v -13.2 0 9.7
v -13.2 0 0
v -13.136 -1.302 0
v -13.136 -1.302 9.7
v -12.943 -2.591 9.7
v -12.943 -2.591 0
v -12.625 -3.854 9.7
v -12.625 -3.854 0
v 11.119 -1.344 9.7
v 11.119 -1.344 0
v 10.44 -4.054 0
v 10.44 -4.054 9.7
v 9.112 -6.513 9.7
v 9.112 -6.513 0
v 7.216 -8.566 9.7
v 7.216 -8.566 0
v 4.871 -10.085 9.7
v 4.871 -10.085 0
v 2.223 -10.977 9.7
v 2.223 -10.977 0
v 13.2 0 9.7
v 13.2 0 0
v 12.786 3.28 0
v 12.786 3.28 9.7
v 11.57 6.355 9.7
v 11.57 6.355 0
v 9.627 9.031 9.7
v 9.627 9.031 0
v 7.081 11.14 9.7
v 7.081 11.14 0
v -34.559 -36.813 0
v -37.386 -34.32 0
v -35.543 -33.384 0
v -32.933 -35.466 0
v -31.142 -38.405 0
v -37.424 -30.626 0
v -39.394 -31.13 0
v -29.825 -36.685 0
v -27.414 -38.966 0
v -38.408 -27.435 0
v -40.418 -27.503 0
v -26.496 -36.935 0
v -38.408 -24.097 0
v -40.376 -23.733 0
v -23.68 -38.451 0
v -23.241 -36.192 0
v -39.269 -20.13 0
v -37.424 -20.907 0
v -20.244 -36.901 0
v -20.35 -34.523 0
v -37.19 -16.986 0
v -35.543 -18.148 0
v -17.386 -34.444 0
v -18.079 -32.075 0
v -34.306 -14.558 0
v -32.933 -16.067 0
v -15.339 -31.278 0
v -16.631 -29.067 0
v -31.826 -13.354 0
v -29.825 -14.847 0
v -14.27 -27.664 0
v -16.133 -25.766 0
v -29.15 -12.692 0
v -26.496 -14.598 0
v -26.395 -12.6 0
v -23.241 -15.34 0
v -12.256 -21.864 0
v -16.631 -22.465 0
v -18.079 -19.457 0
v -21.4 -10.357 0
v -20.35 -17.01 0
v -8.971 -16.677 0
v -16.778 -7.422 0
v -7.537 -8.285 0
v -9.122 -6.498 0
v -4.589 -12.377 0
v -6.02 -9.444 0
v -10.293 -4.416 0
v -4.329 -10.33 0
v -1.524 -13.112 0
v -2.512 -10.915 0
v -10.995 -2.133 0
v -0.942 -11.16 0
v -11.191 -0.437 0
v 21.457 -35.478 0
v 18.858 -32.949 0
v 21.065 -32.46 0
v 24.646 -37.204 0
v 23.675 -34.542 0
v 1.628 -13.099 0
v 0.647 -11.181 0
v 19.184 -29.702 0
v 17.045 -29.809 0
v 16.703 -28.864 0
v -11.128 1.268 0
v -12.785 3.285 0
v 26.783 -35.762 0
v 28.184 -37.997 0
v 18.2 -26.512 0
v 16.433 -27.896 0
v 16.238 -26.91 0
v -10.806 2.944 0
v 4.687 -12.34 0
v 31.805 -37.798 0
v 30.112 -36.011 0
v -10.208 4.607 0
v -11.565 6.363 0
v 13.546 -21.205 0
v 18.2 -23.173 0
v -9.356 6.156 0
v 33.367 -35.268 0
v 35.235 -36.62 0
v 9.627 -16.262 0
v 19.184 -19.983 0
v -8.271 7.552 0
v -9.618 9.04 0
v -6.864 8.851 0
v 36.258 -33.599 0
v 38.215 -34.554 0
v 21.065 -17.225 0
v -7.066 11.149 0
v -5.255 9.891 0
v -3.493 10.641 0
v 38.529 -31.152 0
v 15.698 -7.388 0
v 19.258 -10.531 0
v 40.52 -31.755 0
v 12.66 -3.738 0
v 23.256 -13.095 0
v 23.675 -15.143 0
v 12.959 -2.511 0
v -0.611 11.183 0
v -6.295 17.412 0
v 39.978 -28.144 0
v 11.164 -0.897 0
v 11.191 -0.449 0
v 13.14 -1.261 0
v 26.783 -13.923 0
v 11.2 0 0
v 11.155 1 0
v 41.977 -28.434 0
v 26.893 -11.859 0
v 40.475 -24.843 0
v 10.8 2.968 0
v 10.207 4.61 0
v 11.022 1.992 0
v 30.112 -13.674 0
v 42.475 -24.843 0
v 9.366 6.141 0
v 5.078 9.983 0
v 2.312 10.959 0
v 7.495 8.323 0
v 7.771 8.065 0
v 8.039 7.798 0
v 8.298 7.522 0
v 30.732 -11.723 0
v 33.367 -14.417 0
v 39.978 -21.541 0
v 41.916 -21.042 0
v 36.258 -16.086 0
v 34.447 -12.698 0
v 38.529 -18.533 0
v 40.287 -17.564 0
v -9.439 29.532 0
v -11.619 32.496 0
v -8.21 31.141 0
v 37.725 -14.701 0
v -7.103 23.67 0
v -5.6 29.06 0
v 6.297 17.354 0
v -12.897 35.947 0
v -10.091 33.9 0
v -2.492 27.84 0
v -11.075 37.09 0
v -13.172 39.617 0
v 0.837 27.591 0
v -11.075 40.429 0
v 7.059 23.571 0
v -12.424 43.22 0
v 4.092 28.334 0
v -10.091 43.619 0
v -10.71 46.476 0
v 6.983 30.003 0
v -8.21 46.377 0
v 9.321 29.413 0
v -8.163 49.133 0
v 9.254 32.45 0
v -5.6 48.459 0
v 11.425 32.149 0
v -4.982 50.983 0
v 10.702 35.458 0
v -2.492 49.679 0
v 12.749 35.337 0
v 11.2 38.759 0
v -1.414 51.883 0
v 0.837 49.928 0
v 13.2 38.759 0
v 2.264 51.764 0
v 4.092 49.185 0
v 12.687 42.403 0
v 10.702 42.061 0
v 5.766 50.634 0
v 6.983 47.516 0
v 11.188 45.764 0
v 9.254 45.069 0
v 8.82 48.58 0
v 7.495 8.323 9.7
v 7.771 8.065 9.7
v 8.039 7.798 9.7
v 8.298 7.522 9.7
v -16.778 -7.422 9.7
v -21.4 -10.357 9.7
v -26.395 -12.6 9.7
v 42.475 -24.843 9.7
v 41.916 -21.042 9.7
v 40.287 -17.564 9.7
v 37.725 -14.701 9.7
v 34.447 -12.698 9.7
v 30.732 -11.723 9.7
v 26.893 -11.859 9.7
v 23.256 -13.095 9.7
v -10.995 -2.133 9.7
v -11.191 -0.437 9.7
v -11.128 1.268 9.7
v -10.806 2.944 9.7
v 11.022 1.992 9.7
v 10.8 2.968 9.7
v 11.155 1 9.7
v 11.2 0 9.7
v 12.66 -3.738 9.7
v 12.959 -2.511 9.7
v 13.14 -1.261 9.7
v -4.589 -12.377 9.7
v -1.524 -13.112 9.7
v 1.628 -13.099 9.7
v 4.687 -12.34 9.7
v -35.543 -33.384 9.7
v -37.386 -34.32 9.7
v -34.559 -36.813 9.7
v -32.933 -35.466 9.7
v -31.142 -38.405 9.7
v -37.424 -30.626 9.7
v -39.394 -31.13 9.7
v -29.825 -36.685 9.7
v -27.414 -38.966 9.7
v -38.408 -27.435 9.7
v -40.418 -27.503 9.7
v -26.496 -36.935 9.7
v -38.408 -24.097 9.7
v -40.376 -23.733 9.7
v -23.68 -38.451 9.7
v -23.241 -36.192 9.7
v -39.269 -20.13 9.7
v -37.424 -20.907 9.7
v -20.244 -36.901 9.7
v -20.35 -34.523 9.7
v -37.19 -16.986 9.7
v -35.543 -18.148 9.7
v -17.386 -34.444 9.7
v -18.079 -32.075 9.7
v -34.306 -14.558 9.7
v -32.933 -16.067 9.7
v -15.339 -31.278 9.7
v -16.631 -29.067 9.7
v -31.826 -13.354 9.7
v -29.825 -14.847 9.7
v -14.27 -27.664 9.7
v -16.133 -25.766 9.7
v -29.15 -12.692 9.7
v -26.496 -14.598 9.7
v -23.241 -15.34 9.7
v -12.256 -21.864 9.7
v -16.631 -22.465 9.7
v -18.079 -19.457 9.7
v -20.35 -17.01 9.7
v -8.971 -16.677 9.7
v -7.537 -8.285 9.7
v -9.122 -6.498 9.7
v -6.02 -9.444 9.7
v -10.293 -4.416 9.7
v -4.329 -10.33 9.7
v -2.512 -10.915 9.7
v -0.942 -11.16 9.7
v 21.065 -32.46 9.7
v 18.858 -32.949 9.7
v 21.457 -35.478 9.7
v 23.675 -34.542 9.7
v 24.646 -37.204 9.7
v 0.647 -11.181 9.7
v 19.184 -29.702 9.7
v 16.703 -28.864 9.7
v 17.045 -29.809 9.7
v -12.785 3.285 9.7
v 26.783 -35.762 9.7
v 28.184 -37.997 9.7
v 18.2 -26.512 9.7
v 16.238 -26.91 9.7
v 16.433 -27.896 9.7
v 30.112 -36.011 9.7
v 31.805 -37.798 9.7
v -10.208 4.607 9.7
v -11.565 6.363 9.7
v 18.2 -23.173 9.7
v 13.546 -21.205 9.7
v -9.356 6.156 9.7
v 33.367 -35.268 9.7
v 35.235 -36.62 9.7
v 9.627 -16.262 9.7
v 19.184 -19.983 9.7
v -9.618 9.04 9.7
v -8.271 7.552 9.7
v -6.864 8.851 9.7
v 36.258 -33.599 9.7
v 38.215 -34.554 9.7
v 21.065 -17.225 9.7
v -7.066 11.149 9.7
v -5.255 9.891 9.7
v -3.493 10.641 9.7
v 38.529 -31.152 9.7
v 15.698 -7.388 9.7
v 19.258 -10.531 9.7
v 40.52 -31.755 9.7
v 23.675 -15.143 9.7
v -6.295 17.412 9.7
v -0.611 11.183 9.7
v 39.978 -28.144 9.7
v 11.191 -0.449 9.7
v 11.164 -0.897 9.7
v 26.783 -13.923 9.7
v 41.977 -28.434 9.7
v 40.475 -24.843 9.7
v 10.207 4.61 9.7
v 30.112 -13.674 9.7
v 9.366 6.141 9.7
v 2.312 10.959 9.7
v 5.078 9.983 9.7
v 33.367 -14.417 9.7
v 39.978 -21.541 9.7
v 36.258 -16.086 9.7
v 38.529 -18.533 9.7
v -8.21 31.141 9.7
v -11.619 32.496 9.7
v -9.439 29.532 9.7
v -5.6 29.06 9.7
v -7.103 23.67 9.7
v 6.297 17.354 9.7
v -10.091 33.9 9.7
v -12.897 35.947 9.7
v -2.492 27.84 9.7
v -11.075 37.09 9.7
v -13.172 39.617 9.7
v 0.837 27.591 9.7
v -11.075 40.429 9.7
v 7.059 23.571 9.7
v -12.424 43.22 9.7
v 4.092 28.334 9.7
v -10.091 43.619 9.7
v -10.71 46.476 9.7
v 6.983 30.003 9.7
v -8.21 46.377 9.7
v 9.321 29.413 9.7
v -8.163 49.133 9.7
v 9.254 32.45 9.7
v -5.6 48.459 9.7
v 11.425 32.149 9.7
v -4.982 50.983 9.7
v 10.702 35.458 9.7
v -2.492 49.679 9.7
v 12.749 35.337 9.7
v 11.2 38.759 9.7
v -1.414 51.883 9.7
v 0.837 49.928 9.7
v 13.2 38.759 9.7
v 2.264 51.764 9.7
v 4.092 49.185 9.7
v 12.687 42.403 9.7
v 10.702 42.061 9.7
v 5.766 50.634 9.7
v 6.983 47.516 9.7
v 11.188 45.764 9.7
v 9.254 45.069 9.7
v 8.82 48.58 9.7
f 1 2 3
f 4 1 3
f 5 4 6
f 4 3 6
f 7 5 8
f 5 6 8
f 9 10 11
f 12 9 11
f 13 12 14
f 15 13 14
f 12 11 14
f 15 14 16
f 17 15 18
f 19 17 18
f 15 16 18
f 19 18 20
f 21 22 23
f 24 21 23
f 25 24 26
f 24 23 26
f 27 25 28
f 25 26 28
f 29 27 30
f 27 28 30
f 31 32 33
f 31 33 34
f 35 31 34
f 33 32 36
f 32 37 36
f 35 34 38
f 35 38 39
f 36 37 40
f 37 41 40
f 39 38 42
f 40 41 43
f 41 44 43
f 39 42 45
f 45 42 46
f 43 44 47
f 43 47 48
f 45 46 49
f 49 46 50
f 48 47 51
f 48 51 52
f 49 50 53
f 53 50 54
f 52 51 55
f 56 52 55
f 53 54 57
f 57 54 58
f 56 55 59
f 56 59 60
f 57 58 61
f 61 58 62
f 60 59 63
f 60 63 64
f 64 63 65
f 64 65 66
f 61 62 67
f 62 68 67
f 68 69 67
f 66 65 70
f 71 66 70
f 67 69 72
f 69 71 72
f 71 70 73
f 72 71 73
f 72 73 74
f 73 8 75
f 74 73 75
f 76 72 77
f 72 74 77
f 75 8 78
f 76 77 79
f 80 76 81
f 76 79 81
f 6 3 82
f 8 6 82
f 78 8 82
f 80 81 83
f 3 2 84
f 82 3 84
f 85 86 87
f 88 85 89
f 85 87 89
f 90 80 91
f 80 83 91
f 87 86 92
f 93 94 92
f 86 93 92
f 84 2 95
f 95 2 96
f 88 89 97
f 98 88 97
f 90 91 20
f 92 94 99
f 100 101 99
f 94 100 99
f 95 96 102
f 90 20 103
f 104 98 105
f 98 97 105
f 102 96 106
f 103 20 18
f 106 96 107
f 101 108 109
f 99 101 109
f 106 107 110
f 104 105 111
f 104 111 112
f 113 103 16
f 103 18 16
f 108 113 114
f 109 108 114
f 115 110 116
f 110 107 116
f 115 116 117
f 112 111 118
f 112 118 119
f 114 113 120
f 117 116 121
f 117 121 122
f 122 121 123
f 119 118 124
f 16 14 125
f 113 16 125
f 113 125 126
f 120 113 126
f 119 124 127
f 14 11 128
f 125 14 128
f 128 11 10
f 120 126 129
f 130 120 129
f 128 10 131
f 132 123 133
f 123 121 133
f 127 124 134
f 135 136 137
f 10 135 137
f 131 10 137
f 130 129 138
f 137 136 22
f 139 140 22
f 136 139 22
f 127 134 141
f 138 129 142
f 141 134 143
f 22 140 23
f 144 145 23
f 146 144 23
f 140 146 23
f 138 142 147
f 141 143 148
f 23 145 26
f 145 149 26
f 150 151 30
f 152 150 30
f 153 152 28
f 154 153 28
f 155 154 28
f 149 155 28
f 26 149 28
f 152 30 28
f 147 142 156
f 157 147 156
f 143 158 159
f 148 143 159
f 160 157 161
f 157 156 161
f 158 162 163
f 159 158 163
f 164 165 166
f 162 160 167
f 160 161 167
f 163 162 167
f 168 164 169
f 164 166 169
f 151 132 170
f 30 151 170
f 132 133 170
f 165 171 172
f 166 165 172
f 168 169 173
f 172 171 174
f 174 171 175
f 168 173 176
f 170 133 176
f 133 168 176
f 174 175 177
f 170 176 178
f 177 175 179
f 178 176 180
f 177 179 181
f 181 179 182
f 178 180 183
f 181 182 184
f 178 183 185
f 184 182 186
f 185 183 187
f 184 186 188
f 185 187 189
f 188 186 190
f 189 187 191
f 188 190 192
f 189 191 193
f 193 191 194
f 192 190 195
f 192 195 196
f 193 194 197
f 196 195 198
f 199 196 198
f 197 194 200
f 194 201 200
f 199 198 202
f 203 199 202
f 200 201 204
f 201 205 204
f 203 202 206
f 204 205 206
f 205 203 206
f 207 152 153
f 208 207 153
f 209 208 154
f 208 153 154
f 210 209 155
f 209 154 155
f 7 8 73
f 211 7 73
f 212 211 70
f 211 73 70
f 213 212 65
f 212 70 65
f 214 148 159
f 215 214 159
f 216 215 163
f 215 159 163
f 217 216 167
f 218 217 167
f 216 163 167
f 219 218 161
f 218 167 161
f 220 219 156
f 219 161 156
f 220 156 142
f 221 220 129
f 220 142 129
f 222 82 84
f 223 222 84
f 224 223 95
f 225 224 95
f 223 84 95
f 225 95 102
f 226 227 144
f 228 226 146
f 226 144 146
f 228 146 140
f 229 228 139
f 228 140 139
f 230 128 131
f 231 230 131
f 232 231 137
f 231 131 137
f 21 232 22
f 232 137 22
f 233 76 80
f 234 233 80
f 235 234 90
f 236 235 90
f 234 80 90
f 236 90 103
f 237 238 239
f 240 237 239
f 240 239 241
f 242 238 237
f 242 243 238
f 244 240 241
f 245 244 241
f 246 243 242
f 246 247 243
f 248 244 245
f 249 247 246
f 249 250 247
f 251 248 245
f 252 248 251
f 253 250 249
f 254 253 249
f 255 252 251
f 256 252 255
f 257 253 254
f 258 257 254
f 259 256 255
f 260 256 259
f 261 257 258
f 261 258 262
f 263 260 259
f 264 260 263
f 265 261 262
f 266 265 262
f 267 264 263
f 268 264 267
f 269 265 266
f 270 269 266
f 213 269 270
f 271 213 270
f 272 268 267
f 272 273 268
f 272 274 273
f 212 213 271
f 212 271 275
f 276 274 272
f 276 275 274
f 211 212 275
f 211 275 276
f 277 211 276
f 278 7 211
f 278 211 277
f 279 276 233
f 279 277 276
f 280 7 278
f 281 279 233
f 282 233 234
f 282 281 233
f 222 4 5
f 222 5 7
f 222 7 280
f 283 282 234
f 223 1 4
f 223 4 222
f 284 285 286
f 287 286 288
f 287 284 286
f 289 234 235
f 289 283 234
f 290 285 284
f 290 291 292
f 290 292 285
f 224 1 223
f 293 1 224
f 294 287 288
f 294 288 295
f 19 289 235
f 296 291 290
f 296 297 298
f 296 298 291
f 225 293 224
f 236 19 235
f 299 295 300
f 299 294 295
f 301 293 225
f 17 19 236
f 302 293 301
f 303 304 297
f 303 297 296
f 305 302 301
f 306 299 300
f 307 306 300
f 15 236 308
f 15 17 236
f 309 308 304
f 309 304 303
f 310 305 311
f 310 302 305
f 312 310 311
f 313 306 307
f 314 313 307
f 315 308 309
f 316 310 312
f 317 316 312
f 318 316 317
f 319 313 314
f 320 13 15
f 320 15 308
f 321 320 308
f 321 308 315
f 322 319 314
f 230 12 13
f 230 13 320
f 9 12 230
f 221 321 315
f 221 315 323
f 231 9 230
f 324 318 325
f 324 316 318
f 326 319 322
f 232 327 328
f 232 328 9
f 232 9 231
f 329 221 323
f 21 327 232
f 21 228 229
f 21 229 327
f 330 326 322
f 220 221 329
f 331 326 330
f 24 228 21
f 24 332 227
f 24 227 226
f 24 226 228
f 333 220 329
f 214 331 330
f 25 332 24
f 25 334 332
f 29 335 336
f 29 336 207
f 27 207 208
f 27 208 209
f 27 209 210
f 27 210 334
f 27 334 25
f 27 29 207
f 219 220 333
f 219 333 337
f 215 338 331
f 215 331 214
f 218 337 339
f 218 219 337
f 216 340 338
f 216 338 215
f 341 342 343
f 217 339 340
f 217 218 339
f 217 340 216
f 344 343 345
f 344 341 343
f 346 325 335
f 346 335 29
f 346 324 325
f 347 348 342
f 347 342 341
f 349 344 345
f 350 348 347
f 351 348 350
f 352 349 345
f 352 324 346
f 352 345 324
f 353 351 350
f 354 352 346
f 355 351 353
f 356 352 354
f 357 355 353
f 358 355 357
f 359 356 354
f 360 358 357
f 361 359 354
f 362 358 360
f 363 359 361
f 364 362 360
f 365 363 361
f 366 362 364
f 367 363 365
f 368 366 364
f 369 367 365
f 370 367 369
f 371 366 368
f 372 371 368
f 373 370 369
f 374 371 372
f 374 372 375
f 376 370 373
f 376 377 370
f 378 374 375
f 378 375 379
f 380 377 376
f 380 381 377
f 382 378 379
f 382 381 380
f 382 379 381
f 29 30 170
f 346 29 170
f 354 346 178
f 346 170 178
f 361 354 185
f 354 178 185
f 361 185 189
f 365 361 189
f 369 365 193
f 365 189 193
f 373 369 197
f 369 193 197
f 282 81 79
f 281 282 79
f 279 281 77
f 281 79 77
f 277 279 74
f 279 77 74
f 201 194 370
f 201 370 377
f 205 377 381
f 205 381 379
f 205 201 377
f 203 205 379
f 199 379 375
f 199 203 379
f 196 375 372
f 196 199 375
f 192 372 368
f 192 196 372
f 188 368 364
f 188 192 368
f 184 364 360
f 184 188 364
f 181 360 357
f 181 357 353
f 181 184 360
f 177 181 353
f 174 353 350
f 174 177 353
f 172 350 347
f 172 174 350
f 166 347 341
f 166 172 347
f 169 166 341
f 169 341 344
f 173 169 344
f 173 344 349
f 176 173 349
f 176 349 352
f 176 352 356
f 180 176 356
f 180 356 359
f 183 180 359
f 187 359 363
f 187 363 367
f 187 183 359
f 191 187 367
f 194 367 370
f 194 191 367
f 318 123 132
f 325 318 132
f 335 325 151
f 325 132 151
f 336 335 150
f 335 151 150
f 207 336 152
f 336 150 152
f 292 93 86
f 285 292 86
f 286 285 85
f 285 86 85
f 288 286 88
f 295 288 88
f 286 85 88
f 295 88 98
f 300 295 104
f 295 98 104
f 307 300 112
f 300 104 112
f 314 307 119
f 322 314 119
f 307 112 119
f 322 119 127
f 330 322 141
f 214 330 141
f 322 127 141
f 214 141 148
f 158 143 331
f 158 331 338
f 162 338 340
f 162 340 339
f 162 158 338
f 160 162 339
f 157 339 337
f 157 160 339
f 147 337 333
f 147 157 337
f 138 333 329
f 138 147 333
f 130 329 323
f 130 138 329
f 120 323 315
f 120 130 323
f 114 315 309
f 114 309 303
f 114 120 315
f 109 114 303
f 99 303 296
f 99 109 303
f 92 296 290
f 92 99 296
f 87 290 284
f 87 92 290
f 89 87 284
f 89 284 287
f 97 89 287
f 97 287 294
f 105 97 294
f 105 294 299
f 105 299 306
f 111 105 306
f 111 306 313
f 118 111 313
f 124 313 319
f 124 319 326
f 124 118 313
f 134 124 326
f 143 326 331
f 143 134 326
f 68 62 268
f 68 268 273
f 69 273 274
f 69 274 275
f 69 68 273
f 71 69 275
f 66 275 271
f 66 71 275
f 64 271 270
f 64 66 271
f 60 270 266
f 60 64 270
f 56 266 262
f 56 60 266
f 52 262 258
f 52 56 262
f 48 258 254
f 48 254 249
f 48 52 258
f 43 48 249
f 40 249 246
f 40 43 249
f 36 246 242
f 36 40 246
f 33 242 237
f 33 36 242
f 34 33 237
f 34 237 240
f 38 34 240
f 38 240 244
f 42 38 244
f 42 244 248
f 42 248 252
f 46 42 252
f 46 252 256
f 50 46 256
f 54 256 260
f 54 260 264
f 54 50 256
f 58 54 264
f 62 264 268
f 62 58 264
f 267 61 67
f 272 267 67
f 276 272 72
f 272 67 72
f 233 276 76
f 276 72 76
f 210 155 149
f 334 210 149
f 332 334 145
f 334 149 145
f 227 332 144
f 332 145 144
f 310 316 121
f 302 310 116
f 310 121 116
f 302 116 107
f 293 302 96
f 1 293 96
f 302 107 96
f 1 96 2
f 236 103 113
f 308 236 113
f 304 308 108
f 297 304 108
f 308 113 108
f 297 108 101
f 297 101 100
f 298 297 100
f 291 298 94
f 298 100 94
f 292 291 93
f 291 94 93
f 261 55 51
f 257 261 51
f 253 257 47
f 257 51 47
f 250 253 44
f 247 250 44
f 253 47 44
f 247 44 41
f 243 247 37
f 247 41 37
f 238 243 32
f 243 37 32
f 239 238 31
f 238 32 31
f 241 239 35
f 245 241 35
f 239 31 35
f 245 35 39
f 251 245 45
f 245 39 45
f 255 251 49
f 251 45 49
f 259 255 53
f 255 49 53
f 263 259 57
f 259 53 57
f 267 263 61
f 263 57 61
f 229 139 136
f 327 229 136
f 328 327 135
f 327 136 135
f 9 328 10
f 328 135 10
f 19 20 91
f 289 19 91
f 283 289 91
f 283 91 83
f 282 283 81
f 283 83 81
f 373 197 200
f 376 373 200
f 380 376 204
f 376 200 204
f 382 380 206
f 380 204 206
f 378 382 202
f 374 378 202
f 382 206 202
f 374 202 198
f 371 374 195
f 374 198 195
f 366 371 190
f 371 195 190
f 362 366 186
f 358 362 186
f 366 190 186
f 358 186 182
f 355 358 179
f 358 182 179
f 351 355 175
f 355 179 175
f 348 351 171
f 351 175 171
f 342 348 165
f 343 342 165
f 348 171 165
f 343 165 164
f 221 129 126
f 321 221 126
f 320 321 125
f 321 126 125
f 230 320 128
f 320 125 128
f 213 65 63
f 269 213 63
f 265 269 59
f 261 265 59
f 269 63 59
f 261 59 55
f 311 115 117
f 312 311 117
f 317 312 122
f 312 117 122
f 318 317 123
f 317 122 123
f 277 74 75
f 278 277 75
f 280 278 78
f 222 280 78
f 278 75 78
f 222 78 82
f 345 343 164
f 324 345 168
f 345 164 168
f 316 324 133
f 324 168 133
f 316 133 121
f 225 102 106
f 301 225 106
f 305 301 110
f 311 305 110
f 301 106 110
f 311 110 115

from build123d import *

# Parameters (mm, degrees)
F0_R     = 11.2
F1_DEPTH = 9.7


with BuildPart() as f1:
    # F0 (on Top) → F1 (new body)
    with BuildSketch(Plane.XY):
        with BuildLine():
            ThreePointArc((10.7997121538, 2.9675271514), (11.9439907052, 1.4385768038), (13.2, 0))
            ThreePointArc((13.2, 0), (11.569588838, 6.3548889934), (7.0811190729, 11.1399170857))
            ThreePointArc((7.0811190729, 11.1399170857), (7.6213974776, 9.3082070065), (8.2978828887, 7.5223094569))
            ThreePointArc((8.2978828887, 7.5223094569), (9.8166208323, 5.3920270247), (10.7997121538, 2.9675271514))
        make_face()
        with BuildLine():
            ThreePointArc((12.6597128294, -3.7378698582), (13.0642299687, -1.8883578384), (13.2, 0))
            ThreePointArc((13.2, 0), (11.9439907052, 1.4385768038), (10.7997121538, 2.9675271514))
            ThreePointArc((10.7997121538, 2.9675271514), (11.0994769274, 1.4972013687), (11.2, 0))
            ThreePointArc((11.2, 0), (11.1797630339, -0.6729773444), (11.1191252668, -1.343522721))
            ThreePointArc((11.1191252668, -1.343522721), (11.861944996, -2.5583738361), (12.6597128294, -3.7378698582))
        make_face()
        with BuildLine():
            ThreePointArc((7.4945763109, 8.3229397403), (7.255524149, 9.7266841779), (7.0811190729, 11.1399170857))
            ThreePointArc((7.0811190729, 11.1399170857), (2.3229386222, 12.9939969277), (-2.7829079526, 12.9033105569))
            ThreePointArc((-2.7829079526, 12.9033105569), (-3.1202534931, 11.7668491168), (-3.4928140977, 10.641440207))
            ThreePointArc((-3.4928140977, 10.641440207), (2.312441633, 10.9586775522), (7.4945763109, 8.3229397403))
        make_face()
        with BuildLine():
            ThreePointArc((-2.7829079526, 12.9033105569), (2.3229386222, 12.9939969277), (7.0811190729, 11.1399170857))
            ThreePointArc((7.0811190729, 11.1399170857), (6.4857475715, 20.4865237167), (9.3208734987, 29.4126417821))
            ThreePointArc((9.3208734987, 29.4126417821), (-0.0838144074, 25.5596354988), (-9.4388150451, 29.5317602575))
            ThreePointArc((-9.4388150451, 29.5317602575), (-6.5025484684, 20.5664657708), (-7.0661295843, 11.1494310482))
            ThreePointArc((-7.0661295843, 11.1494310482), (-5.0019904472, 12.2155675908), (-2.7829079526, 12.9033105569))
        make_face()
        with BuildLine():
            ThreePointArc((8.2978828887, 7.5223094569), (7.6213974776, 9.3082070065), (7.0811190729, 11.1399170857))
            ThreePointArc((7.0811190729, 11.1399170857), (7.255524149, 9.7266841779), (7.4945763109, 8.3229397403))
            ThreePointArc((7.4945763109, 8.3229397403), (7.9063704761, 7.9327993732), (8.2978828887, 7.5223094569))
        make_face()
        with BuildLine():
            ThreePointArc((23.2557426949, -13.0949401652), (17.417829946, -9.0277901137), (12.6597128294, -3.7378698582))
            ThreePointArc((12.6597128294, -3.7378698582), (12.0939465538, -5.2892775267), (11.338902988, -6.7579049289))
            ThreePointArc((11.338902988, -6.7579049289), (8.4850698318, -10.1115572465), (4.6869245883, -12.3398840312))
            ThreePointArc((4.6869245883, -12.3398840312), (11.7287918196, -18.6207932863), (16.2380497133, -26.9095994984))
            ThreePointArc((16.2380497133, -26.9095994984), (17.5066070915, -18.8642279298), (23.2557426949, -13.0949401652))
        make_face()
        with BuildLine():
            ThreePointArc((11.338902988, -6.7579049289), (12.0939465538, -5.2892775267), (12.6597128294, -3.7378698582))
            ThreePointArc((12.6597128294, -3.7378698582), (11.861944996, -2.5583738361), (11.1191252668, -1.343522721))
            ThreePointArc((11.1191252668, -1.343522721), (10.3448630317, -4.2922964548), (8.8040757601, -6.9230231843))
            ThreePointArc((8.8040757601, -6.9230231843), (10.0695256921, -6.8103184234), (11.338902988, -6.7579049289))
        make_face()
        with BuildLine():
            ThreePointArc((-3.4928140977, 10.641440207), (-3.1202534931, 11.7668491168), (-2.7829079526, 12.9033105569))
            ThreePointArc((-2.7829079526, 12.9033105569), (-5.0019904472, 12.2155675908), (-7.0661295843, 11.1494310482))
            ThreePointArc((-7.0661295843, 11.1494310482), (-7.6009366797, 9.3278062246), (-8.271259726, 7.5515735145))
            ThreePointArc((-8.271259726, 7.5515735145), (-6.0815439879, 9.4050424094), (-3.4928140977, 10.641440207))
        make_face()
        with BuildLine():
            ThreePointArc((-9.4388150451, 29.5317602575), (-0.0838144074, 25.5596354988), (9.3208734987, 29.4126417821))
            ThreePointArc((9.3208734987, 29.4126417821), (12.1917088667, 33.6995042954), (13.2, 38.7593694031))
            ThreePointArc((13.2, 38.7593694031), (-4.9823509212, 50.9829604998), (-9.4388150451, 29.5317602575))
        make_face()
        with Locations((0, 38.7593694031)):
            Circle(F0_R, mode=Mode.SUBTRACT)
        with BuildLine():
            ThreePointArc((4.6869245883, -12.3398840312), (8.4850698318, -10.1115572465), (11.338902988, -6.7579049289))
            ThreePointArc((11.338902988, -6.7579049289), (10.0695256921, -6.8103184234), (8.8040757601, -6.9230231843))
            ThreePointArc((8.8040757601, -6.9230231843), (5.8741972555, -9.5359219063), (2.2226209928, -10.9772471924))
            ThreePointArc((2.2226209928, -10.9772471924), (3.4721946655, -11.6270584722), (4.6869245883, -12.3398840312))
        make_face()
        with BuildLine():
            ThreePointArc((42.4751993984, -24.8425416648), (36.1593540856, -13.5798415337), (23.2557426949, -13.0949401652))
            ThreePointArc((23.2557426949, -13.0949401652), (17.5066070915, -18.8642279298), (16.2380497133, -26.9095994984))
            ThreePointArc((16.2380497133, -26.9095994984), (16.6811751612, -28.3481754864), (17.0450643135, -29.8088074457))
            ThreePointArc((17.0450643135, -29.8088074457), (31.8052405917, -37.797806678), (42.4751993984, -24.8425416648))
        make_face()
        with Locations((29.2751993984, -24.8425416648)):
            Circle(F0_R, mode=Mode.SUBTRACT)
        with BuildLine():
            ThreePointArc((-8.271259726, 7.5515735145), (-7.6009366797, 9.3278062246), (-7.0661295843, 11.1494310482))
            ThreePointArc((-7.0661295843, 11.1494310482), (-11.5653125879, 6.3626680523), (-13.2, 0))
            ThreePointArc((-13.2, 0), (-11.947646657, 1.4268660523), (-10.8061773678, 2.9438971952))
            ThreePointArc((-10.8061773678, 2.9438971952), (-9.8129924989, 5.3986274383), (-8.271259726, 7.5515735145))
        make_face()
        with BuildLine():
            ThreePointArc((-4.589179085, -12.3765679946), (0.0522012849, -13.1998967809), (4.6869245883, -12.3398840312))
            ThreePointArc((4.6869245883, -12.3398840312), (3.4721946655, -11.6270584722), (2.2226209928, -10.9772471924))
            ThreePointArc((2.2226209928, -10.9772471924), (-0.1479208812, -11.1990231455), (-2.5117781872, -10.9147134794))
            ThreePointArc((-2.5117781872, -10.9147134794), (-3.5678638565, -11.6209350826), (-4.589179085, -12.3765679946))
        make_face()
        with BuildLine():
            ThreePointArc((17.0450643135, -29.8088074457), (16.6811751612, -28.3481754864), (16.2380497133, -26.9095994984))
            ThreePointArc((16.2380497133, -26.9095994984), (16.5586640372, -28.3822773057), (17.0450643135, -29.8088074457))
        make_face()
        with BuildLine():
            ThreePointArc((-10.8061773678, 2.9438971952), (-11.947646657, 1.4268660523), (-13.2, 0))
            ThreePointArc((-13.2, 0), (-13.0554049975, -1.9484353598), (-12.6247878255, -3.8541837476))
            ThreePointArc((-12.6247878255, -3.8541837476), (-11.7965458081, -3.0060317688), (-10.9951085748, -2.1325073104))
            ThreePointArc((-10.9951085748, -2.1325073104), (-11.192251242, 0.4165478802), (-10.8061773678, 2.9438971952))
        make_face()
        with BuildLine():
            ThreePointArc((-7.5366184006, -8.2848888396), (-9.7631539879, -5.4882441826), (-10.9951085748, -2.1325073104))
            ThreePointArc((-10.9951085748, -2.1325073104), (-11.7965458081, -3.0060317688), (-12.6247878255, -3.8541837476))
            ThreePointArc((-12.6247878255, -3.8541837476), (-11.6907811636, -6.1290811535), (-10.3510105514, -8.1912502442))
            ThreePointArc((-10.3510105514, -8.1912502442), (-8.9426172679, -8.2020863754), (-7.5366184006, -8.2848888396))
        make_face()
        with BuildLine():
            ThreePointArc((-14.2702107489, -27.6635521839), (-10.7633961504, -19.1754458925), (-4.589179085, -12.3765679946))
            ThreePointArc((-4.589179085, -12.3765679946), (-7.7576760542, -10.6798156463), (-10.3510105514, -8.1912502442))
            ThreePointArc((-10.3510105514, -8.1912502442), (-11.6907811636, -6.1290811535), (-12.6247878255, -3.8541837476))
            ThreePointArc((-12.6247878255, -3.8541837476), (-19.0361183181, -8.9729874739), (-26.3951306605, -12.5995902391))
            ThreePointArc((-26.3951306605, -12.5995902391), (-17.6733855055, -16.7701576999), (-14.1331403732, -25.7662199438))
            ThreePointArc((-14.1331403732, -25.7662199438), (-14.1674525628, -26.7173584612), (-14.2702107489, -27.6635521839))
        make_face()
        with BuildLine():
            ThreePointArc((-10.3510105514, -8.1912502442), (-7.7576760542, -10.6798156463), (-4.589179085, -12.3765679946))
            ThreePointArc((-4.589179085, -12.3765679946), (-3.5678638565, -11.6209350826), (-2.5117781872, -10.9147134794))
            ThreePointArc((-2.5117781872, -10.9147134794), (-5.1934153411, -9.923126377), (-7.5366184006, -8.2848888396))
            ThreePointArc((-7.5366184006, -8.2848888396), (-8.9426172679, -8.2020863754), (-10.3510105514, -8.1912502442))
        make_face()
        with BuildLine():
            ThreePointArc((-34.3061189534, -14.5582955275), (-34.5587070595, -36.8129925975), (-14.2702107489, -27.6635521839))
            ThreePointArc((-14.2702107489, -27.6635521839), (-14.1674525628, -26.7173584612), (-14.1331403732, -25.7662199438))
            ThreePointArc((-14.1331403732, -25.7662199438), (-17.6733855055, -16.7701576999), (-26.3951306605, -12.5995902391))
            ThreePointArc((-26.3951306605, -12.5995902391), (-30.2980685136, -13.7912117857), (-34.3061189534, -14.5582955275))
        make_face()
        with Locations((-27.3331403732, -25.7662199438)):
            Circle(F0_R, mode=Mode.SUBTRACT)
        with BuildLine():
            ThreePointArc((-34.3061189534, -14.5582955275), (-30.2980685136, -13.7912117857), (-26.3951306605, -12.5995902391))
            ThreePointArc((-26.3951306605, -12.5995902391), (-30.5055753859, -12.9531150862), (-34.3061189534, -14.5582955275))
        make_face()
    extrude(amount=F1_DEPTH)


solid = f1.part
